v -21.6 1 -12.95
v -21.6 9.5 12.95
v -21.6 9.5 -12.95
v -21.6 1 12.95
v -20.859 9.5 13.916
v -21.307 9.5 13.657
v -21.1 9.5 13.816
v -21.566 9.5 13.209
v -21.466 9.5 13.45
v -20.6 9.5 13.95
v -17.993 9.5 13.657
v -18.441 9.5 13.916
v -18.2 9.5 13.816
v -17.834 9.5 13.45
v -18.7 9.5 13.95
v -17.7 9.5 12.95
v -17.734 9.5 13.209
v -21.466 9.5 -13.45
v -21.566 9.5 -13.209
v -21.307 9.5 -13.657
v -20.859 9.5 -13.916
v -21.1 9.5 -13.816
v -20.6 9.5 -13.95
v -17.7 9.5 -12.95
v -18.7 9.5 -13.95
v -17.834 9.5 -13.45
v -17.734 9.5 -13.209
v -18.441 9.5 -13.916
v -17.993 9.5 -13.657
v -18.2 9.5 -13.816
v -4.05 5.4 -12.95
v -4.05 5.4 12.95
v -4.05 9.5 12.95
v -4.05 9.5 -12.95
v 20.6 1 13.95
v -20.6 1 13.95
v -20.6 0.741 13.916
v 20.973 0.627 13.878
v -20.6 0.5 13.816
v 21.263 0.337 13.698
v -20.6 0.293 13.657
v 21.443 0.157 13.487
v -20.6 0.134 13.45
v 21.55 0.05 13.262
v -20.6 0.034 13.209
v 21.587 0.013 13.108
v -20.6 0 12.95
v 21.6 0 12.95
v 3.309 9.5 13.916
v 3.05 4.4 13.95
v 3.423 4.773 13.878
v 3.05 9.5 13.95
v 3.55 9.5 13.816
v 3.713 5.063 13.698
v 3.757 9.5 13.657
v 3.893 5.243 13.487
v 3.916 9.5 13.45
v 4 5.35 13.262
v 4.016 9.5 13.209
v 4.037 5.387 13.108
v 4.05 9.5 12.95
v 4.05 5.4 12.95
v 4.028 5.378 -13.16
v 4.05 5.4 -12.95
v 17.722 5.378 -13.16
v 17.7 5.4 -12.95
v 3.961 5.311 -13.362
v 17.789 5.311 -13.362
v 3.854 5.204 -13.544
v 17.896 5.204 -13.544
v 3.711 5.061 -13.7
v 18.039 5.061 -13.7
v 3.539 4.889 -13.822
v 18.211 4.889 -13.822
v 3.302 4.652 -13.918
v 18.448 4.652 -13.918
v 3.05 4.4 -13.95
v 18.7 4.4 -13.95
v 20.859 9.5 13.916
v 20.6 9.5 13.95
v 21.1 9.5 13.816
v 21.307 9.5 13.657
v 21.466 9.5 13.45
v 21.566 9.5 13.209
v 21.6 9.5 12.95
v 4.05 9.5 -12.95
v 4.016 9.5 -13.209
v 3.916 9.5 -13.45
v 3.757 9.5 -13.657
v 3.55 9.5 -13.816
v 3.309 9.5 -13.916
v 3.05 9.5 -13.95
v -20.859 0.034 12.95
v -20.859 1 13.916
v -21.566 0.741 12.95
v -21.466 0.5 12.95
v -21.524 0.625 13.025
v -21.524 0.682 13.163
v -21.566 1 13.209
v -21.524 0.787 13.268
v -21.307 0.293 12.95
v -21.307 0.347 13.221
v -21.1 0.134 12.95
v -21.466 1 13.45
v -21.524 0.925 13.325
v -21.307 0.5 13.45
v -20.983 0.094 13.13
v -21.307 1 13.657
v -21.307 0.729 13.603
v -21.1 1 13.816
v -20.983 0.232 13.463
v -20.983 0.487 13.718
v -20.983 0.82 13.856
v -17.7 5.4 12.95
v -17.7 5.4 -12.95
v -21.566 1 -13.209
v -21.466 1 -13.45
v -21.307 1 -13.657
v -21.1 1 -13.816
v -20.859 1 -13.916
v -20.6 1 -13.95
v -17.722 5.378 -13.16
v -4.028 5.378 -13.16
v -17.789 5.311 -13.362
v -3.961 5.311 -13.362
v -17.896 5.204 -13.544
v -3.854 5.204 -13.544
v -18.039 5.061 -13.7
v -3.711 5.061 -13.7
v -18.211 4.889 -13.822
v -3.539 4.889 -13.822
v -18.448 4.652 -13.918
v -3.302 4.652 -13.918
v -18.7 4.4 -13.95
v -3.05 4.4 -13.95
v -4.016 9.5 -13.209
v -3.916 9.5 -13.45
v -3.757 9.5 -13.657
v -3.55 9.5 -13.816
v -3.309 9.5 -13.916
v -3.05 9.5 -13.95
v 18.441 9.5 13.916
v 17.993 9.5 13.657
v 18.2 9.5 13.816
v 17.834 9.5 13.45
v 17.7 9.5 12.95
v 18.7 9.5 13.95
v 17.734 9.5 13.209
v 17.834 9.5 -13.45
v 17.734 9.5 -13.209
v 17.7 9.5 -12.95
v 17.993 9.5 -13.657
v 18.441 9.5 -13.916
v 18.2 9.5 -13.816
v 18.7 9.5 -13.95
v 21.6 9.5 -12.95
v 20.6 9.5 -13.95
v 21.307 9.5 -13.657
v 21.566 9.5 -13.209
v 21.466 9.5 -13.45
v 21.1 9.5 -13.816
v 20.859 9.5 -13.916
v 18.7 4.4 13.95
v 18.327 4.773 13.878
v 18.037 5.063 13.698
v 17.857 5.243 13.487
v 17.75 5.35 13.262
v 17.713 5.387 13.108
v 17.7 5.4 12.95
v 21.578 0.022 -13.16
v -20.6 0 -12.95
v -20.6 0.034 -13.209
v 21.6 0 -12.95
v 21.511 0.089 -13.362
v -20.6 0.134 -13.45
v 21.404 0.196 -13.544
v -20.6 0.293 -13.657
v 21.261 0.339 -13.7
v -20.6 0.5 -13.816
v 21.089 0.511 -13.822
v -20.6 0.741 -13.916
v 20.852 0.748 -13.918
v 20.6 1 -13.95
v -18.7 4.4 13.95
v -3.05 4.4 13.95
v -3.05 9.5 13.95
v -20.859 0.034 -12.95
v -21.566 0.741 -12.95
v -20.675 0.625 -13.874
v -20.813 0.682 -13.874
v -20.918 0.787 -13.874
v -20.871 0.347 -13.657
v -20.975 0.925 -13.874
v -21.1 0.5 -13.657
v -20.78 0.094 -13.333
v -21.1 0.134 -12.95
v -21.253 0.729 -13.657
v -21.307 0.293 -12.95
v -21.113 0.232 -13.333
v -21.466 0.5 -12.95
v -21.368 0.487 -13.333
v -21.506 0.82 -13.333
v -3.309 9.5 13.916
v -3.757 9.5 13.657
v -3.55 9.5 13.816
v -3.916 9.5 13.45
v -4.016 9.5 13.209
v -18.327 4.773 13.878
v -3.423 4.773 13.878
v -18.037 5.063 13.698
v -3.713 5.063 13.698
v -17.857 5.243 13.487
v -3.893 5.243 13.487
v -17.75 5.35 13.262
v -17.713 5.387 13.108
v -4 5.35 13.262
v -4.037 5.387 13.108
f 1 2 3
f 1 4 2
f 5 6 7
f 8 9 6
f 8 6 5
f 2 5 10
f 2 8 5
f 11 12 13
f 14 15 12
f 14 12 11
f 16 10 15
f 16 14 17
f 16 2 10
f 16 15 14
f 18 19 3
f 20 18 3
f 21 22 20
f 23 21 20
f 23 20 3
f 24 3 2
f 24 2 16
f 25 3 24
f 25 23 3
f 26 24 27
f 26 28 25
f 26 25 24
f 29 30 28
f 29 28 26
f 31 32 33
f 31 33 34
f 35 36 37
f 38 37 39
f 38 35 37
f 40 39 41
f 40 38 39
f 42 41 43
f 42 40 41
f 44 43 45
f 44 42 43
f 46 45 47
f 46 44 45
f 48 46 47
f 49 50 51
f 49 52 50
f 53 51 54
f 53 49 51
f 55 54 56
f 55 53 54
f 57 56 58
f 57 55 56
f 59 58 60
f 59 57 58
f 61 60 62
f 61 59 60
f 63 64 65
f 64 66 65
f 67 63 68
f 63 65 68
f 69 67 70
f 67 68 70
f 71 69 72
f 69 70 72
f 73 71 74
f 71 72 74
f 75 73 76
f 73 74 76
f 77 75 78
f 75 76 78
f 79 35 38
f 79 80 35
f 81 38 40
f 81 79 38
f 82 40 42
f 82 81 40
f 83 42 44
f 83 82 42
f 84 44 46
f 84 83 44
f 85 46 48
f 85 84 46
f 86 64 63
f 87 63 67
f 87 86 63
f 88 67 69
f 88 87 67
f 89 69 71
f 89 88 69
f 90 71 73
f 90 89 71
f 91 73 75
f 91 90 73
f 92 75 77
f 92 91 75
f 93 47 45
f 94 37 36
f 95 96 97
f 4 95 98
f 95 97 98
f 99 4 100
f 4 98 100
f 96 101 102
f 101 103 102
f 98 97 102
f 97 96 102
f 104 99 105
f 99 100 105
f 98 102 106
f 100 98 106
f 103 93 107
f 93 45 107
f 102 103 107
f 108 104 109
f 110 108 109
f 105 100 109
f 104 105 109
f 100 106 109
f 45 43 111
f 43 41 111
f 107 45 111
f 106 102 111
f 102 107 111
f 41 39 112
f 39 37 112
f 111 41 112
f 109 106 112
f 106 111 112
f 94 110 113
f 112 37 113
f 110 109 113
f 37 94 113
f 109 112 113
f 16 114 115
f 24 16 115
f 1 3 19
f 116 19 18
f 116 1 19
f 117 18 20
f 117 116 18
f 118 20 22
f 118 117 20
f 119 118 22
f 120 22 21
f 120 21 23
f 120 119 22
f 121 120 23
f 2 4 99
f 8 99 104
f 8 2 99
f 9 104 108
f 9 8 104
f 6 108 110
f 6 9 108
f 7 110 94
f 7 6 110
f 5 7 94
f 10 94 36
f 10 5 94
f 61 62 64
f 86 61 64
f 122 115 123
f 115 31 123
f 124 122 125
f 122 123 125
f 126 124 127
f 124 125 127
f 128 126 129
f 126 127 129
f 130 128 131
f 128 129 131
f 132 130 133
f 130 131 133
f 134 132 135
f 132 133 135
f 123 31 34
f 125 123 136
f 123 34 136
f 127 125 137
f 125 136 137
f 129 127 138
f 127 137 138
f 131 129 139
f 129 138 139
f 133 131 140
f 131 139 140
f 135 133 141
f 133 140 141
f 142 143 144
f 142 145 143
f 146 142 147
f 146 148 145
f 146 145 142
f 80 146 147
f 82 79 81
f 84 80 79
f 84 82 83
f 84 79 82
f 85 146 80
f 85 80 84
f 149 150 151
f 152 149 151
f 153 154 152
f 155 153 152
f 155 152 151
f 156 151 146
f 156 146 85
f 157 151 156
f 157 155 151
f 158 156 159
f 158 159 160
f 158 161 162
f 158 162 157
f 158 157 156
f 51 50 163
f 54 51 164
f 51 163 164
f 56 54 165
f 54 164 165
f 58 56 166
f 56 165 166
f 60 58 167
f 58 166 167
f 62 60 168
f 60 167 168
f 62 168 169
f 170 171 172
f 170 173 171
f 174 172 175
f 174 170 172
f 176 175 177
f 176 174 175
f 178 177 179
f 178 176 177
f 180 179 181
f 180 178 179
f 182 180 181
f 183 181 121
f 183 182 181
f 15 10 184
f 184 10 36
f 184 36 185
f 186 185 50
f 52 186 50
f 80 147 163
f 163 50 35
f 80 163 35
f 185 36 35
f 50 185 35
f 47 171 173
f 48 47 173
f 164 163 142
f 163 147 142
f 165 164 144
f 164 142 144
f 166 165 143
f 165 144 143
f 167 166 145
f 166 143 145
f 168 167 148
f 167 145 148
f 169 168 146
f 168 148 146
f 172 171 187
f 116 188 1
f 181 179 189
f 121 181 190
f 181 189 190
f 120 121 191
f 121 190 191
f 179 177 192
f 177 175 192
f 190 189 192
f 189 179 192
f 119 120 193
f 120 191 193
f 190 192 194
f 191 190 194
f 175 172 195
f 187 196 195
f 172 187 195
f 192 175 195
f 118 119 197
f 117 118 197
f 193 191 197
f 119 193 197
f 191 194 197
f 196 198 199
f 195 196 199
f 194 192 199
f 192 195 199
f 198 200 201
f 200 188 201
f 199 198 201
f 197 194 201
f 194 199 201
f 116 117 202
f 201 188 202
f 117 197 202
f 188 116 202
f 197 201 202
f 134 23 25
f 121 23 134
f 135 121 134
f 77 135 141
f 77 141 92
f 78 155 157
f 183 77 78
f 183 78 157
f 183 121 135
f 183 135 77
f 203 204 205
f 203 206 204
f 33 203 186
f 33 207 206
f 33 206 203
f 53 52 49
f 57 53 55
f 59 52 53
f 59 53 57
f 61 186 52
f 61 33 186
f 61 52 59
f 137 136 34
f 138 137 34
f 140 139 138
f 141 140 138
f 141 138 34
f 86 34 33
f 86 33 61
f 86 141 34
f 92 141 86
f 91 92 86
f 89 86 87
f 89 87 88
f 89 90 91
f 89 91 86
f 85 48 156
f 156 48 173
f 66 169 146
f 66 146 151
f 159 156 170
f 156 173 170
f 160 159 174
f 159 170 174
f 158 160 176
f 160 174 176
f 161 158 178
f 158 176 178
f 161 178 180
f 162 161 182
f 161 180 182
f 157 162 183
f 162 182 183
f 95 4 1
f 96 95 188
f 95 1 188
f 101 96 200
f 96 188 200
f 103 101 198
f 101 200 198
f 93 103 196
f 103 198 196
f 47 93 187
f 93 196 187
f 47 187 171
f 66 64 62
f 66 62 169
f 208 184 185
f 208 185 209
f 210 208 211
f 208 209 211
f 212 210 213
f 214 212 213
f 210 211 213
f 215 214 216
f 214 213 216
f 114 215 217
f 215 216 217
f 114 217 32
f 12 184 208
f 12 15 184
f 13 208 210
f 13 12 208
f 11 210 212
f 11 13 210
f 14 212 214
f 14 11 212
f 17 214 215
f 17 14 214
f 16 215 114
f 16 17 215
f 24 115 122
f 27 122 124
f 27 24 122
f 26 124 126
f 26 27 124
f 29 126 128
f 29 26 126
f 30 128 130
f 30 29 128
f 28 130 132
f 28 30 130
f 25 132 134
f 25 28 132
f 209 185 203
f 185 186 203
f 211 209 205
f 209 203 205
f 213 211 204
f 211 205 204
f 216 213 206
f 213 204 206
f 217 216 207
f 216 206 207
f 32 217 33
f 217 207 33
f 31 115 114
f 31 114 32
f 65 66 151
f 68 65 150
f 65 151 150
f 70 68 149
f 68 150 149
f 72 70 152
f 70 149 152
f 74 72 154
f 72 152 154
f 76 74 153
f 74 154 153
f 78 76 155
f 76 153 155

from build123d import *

# Parameters (mm, degrees)
SKETCH_1_W      = 43.2
SKETCH_1_H      = 27.9
EXTRUDE_1_DEPTH = 5.4
SKETCH_2_W      = 8.1
SKETCH_2_H      = 27.9
SKETCH_2_W_2    = 3.9
EXTRUDE_2_DEPTH = 4.1
FILLET_1_R      = 1


with BuildPart() as part:
    # Эскиз1 → Бобышка-Вытянуть1 (new body)
    with BuildSketch(Plane(origin=(0, 0, 0), x_dir=(1, 0, 0), z_dir=(0, 1, 0))):
        Rectangle(SKETCH_1_W, SKETCH_1_H)
    extrude(amount=EXTRUDE_1_DEPTH)

    # Эскиз2 → Бобышка-Вытянуть2 (add)
    with BuildSketch(Plane(origin=(0, 5.4, 0), x_dir=(1, 0, 0), z_dir=(0, 1, 0))):
        Rectangle(SKETCH_2_W, SKETCH_2_H)
        with Locations((-19.65, 0)):
            Rectangle(SKETCH_2_W_2, SKETCH_2_H)
        with Locations((19.65, 0)):
            Rectangle(SKETCH_2_W_2, SKETCH_2_H)
    extrude(amount=EXTRUDE_2_DEPTH)

    # Скругление1
    fillet_1_edges = [part.edges().sort_by_distance(p)[0] for p in [
        (-10.875, 5.4, -13.95),
        (10.875, 5.4, 13.95),
        (4.05, 7.45, 13.95),
        (4.05, 7.45, -13.95),
        (-4.05, 7.45, -13.95),
        (-4.05, 7.45, 13.95),
        (-10.875, 5.4, 13.95),
        (-17.7, 7.45, 13.95),
        (-17.7, 7.45, -13.95),
        (10.875, 5.4, -13.95),
        (17.7, 7.45, -13.95),
        (17.7, 7.45, 13.95),
        (0, 0, 13.95),
        (-21.6, 0, 0),
        (0, 0, -13.95),
        (21.6, 4.75, 13.95),
        (-21.6, 4.75, 13.95),
        (-21.6, 4.75, -13.95),
        (21.6, 4.75, -13.95),
    ]]
    fillet(fillet_1_edges, radius=FILLET_1_R)


solid = part.part
